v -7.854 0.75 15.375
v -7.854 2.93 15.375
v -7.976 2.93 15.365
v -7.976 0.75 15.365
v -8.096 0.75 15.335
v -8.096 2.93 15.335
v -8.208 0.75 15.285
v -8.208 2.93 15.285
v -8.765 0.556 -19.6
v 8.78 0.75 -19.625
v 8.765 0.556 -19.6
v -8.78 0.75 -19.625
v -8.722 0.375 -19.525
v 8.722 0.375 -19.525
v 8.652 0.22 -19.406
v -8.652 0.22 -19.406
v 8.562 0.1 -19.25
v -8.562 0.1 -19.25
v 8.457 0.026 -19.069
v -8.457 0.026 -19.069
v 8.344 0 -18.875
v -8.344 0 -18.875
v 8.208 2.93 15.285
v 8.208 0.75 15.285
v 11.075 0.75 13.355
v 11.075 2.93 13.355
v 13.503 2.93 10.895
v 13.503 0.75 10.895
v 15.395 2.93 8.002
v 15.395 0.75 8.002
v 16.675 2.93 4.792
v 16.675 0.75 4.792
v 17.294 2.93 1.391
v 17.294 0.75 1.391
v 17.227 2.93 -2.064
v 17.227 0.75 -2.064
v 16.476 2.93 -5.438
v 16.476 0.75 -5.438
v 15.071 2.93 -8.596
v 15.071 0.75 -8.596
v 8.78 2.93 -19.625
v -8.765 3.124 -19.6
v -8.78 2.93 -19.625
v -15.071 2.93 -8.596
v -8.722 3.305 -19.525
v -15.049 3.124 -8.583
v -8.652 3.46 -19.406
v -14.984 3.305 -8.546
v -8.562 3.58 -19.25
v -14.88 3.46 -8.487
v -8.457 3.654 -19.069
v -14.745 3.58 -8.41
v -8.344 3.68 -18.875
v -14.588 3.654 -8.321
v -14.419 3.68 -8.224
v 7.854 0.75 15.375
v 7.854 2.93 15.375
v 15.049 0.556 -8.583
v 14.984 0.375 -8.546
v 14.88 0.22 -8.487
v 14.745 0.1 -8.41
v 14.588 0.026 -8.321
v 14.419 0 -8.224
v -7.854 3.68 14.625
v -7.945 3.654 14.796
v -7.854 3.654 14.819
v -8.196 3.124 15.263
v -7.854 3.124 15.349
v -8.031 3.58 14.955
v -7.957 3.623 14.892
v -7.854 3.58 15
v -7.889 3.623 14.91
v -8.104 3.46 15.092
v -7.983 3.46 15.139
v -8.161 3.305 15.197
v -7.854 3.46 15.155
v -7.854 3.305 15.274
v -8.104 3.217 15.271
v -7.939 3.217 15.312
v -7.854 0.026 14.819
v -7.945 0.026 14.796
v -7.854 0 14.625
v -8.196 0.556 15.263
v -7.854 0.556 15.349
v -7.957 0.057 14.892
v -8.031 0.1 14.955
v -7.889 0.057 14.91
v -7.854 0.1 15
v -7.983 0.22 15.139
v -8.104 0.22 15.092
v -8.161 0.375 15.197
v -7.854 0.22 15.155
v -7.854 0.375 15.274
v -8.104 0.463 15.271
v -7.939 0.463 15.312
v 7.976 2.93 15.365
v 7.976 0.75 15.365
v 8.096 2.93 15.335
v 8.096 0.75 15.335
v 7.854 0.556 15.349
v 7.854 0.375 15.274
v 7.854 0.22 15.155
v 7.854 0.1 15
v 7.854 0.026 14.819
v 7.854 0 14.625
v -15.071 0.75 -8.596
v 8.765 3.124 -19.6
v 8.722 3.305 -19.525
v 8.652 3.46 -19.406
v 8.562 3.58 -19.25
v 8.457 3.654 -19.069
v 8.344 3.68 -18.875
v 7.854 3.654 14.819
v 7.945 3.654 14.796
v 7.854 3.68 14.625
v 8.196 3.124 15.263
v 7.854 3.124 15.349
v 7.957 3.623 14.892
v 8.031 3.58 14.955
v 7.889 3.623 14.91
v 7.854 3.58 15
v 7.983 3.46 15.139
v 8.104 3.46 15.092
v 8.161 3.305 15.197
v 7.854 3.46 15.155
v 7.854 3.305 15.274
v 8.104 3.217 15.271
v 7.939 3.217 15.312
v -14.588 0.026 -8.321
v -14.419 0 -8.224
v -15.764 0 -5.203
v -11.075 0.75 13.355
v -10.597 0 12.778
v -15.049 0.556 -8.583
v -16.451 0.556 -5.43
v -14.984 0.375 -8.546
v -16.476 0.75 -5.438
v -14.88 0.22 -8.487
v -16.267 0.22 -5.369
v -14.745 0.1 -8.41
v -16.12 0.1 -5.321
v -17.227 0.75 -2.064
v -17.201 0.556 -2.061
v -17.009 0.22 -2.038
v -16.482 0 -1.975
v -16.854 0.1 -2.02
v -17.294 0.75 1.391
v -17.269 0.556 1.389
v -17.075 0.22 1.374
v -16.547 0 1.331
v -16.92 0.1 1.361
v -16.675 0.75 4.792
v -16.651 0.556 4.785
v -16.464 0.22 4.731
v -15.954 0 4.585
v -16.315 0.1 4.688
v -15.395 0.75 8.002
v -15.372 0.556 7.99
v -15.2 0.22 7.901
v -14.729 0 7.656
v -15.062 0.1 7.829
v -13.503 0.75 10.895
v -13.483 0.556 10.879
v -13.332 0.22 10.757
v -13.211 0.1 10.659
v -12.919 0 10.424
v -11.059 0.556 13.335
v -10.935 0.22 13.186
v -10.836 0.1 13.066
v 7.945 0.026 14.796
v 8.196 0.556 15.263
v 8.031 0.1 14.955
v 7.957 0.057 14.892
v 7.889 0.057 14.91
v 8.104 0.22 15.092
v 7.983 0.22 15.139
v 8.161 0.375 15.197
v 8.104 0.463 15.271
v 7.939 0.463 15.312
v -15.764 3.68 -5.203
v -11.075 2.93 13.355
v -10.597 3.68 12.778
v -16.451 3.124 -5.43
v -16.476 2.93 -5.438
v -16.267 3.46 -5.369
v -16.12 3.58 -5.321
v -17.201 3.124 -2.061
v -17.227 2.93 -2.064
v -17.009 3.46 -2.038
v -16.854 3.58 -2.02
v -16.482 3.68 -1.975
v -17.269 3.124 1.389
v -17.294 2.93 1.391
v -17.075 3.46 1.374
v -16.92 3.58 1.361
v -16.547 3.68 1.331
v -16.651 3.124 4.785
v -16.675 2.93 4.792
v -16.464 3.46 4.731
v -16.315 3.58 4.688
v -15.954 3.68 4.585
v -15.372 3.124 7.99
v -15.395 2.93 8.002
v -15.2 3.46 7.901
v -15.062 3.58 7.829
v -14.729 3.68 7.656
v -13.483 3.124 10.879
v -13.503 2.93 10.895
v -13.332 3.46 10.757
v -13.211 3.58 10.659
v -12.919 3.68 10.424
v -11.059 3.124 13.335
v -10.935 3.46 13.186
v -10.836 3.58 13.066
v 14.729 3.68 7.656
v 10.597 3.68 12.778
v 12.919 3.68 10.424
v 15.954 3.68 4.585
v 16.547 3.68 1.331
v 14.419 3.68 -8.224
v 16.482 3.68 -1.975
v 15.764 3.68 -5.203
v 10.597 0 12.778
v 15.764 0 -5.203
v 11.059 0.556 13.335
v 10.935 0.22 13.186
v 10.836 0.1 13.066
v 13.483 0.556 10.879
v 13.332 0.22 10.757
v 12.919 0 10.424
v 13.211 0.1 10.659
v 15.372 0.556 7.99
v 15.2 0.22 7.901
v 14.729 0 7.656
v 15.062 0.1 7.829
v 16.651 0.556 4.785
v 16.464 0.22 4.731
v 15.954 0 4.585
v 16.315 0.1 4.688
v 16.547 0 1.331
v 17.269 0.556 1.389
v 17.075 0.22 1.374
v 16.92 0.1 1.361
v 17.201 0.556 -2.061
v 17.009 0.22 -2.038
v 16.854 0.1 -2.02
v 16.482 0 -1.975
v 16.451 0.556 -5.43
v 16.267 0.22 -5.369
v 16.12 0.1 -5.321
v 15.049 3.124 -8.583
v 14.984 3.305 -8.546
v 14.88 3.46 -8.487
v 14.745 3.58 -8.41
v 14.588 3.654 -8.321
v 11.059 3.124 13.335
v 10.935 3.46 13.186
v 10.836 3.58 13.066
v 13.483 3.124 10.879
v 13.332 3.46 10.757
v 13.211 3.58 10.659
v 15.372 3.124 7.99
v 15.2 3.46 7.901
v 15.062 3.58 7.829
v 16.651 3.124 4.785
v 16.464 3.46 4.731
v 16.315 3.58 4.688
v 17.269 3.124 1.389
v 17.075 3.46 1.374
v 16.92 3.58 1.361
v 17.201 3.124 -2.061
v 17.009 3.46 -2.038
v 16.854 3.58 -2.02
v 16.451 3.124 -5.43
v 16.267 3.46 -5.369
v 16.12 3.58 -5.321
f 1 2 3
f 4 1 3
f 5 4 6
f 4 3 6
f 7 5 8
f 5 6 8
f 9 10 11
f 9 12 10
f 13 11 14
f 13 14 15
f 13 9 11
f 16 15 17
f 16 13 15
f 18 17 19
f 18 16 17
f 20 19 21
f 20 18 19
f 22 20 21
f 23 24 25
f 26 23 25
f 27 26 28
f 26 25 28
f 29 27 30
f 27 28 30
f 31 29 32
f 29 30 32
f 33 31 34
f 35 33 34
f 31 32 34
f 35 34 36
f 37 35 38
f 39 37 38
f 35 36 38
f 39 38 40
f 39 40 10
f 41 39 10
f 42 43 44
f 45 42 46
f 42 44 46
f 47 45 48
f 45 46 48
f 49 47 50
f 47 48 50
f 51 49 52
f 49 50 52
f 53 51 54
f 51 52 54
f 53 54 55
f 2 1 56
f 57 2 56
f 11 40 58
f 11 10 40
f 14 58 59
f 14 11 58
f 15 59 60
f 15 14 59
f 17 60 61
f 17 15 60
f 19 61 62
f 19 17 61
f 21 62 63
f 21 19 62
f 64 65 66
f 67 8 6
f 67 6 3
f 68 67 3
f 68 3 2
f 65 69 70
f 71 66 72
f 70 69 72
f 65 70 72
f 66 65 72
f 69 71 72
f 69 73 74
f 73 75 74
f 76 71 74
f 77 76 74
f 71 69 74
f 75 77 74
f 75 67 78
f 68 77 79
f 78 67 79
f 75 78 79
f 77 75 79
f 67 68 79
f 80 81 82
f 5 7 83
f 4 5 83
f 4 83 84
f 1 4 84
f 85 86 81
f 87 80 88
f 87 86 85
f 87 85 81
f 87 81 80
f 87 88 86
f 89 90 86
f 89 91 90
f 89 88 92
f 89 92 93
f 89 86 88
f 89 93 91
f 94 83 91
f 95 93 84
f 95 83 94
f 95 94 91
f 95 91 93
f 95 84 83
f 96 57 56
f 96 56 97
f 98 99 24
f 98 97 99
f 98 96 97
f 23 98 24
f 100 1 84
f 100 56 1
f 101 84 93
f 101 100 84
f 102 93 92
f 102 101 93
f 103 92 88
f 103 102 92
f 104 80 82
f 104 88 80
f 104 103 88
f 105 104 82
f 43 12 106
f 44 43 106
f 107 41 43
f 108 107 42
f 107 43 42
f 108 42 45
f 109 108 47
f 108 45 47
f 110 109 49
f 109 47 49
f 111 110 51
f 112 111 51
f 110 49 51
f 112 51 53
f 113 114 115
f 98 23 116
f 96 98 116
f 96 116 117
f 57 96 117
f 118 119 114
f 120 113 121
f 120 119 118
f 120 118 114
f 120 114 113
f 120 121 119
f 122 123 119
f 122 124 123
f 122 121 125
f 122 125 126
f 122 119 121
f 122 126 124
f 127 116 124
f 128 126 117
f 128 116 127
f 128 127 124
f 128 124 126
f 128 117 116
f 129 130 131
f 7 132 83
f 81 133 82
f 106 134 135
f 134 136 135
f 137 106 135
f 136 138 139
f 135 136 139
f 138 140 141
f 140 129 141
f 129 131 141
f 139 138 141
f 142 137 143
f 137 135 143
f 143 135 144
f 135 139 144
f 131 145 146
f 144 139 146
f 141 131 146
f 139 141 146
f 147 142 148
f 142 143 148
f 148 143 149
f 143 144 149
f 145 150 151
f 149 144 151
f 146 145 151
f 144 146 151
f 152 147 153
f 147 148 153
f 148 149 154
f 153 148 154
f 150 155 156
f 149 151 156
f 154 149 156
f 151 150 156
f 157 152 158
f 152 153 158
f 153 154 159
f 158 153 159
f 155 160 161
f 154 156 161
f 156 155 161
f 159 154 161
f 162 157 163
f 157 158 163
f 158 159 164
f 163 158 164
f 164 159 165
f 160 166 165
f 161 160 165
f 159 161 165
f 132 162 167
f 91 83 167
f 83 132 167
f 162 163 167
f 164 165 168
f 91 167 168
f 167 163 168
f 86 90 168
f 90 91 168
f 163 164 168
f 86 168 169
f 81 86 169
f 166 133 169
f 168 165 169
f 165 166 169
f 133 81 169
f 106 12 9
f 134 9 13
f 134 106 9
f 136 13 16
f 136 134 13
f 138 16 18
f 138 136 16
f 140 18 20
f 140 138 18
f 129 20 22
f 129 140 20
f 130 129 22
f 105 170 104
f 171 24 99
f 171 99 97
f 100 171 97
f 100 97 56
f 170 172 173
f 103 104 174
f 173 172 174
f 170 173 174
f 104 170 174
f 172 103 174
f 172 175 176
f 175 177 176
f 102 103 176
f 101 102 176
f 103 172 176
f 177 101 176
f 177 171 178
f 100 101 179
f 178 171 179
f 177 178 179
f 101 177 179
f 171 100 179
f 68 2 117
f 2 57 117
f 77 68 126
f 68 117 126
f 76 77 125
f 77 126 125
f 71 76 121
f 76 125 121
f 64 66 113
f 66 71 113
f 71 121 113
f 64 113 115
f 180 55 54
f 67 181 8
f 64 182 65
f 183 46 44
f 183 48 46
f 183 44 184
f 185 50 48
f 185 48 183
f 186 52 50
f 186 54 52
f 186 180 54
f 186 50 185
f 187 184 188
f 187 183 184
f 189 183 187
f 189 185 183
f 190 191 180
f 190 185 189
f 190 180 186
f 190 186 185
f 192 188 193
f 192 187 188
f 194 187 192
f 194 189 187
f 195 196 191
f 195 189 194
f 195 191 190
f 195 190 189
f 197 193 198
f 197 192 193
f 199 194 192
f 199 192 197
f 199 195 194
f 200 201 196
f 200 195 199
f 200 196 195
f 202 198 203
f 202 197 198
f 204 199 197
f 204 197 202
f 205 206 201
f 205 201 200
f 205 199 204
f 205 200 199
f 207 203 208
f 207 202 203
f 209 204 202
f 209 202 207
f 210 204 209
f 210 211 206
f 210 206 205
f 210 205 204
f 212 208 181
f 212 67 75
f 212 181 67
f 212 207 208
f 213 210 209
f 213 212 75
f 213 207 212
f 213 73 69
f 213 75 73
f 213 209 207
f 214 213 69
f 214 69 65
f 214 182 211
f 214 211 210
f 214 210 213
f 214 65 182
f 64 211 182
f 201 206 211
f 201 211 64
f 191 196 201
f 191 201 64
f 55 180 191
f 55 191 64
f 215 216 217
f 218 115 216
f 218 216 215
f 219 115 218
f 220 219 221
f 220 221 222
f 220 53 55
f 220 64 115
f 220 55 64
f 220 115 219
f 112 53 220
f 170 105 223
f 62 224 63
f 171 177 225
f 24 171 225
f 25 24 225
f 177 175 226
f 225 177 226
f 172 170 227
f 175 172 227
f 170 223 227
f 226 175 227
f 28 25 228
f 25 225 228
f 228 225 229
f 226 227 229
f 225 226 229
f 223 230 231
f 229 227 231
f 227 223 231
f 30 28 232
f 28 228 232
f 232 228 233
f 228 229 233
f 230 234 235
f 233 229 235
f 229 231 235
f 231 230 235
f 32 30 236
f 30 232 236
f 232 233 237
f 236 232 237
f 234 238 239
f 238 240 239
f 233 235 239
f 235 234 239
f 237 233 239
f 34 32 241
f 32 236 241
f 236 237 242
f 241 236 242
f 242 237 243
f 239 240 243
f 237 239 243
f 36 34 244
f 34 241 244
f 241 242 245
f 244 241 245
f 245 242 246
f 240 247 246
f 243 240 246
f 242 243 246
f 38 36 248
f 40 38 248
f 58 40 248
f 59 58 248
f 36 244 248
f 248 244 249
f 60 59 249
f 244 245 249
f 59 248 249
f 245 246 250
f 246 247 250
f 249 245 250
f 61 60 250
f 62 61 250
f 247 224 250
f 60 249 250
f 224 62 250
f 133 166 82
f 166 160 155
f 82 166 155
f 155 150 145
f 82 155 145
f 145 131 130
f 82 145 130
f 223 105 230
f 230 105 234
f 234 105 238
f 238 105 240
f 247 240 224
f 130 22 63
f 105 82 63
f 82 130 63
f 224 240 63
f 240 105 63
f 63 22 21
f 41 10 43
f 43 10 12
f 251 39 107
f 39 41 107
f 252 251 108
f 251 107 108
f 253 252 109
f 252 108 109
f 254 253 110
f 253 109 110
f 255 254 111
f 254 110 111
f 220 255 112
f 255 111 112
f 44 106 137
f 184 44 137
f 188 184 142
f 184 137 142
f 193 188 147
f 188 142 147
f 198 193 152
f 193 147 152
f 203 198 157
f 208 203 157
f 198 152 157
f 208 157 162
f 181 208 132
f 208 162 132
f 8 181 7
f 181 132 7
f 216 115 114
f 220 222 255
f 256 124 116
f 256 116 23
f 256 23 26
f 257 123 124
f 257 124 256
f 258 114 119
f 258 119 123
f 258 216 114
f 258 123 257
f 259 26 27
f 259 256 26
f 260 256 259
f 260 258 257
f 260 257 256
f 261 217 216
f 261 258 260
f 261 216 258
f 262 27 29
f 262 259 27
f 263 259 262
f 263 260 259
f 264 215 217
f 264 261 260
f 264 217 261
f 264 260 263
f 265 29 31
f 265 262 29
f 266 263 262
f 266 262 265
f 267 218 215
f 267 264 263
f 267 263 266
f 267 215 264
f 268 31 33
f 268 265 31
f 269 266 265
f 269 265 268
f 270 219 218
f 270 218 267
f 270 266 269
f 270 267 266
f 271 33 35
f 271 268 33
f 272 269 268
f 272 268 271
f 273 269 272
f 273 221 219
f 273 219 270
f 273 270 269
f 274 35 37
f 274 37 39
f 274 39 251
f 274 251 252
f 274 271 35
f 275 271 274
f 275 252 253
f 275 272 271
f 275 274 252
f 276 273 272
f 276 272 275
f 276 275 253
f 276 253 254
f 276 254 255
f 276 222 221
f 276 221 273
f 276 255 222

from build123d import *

# Parameters (mm, degrees)
BOSS_EXTRUDE1_DEPTH = 3.68
FILLET1_R           = 0.75


with BuildPart() as part:
    # Sketch1 → Boss-Extrude1 (new body)
    with BuildSketch(Plane(origin=(0, 0, 0), x_dir=(1, 0, 0), z_dir=(0, 1, 0))):
        with BuildLine():
            Line((-8.04, -15.374683737), (8.04, -15.374683737))
            ThreePointArc((8.04, -15.374683737), (16.648631389, -4.883192899), (15.070836501, 8.596068122))
            Line((15.070836501, 8.596068122), (8.78, 19.625316263))
            Line((8.78, 19.625316263), (-8.78, 19.625316263))
            Line((-8.78, 19.625316263), (-15.070836501, 8.596068122))
            ThreePointArc((-15.070836501, 8.596068122), (-16.648631389, -4.883192899), (-8.04, -15.374683737))
        make_face()
    extrude(amount=BOSS_EXTRUDE1_DEPTH)

    # Fillet1
    fillet1_edges = [part.edges().sort_by_distance(p)[0] for p in [
        (8.04, 1.84, 15.374683737),
        (-8.04, 1.84, 15.374683737),
        (16.648631389, 3.68, 4.883192899),
        (11.92541825, 3.68, -14.110692193),
        (0, 3.68, -19.625316263),
        (-11.92541825, 3.68, -14.110692193),
        (-16.648631389, 3.68, 4.883192899),
        (-11.92541825, 0, -14.110692193),
        (0, 0, -19.625316263),
        (11.92541825, 0, -14.110692193),
        (16.648631389, 0, 4.883192899),
        (0, 0, 15.374683737),
        (-16.648631389, 0, 4.883192899),
        (0, 3.68, 15.374683737),
    ]]
    fillet(fillet1_edges, radius=FILLET1_R)


solid = part.part
